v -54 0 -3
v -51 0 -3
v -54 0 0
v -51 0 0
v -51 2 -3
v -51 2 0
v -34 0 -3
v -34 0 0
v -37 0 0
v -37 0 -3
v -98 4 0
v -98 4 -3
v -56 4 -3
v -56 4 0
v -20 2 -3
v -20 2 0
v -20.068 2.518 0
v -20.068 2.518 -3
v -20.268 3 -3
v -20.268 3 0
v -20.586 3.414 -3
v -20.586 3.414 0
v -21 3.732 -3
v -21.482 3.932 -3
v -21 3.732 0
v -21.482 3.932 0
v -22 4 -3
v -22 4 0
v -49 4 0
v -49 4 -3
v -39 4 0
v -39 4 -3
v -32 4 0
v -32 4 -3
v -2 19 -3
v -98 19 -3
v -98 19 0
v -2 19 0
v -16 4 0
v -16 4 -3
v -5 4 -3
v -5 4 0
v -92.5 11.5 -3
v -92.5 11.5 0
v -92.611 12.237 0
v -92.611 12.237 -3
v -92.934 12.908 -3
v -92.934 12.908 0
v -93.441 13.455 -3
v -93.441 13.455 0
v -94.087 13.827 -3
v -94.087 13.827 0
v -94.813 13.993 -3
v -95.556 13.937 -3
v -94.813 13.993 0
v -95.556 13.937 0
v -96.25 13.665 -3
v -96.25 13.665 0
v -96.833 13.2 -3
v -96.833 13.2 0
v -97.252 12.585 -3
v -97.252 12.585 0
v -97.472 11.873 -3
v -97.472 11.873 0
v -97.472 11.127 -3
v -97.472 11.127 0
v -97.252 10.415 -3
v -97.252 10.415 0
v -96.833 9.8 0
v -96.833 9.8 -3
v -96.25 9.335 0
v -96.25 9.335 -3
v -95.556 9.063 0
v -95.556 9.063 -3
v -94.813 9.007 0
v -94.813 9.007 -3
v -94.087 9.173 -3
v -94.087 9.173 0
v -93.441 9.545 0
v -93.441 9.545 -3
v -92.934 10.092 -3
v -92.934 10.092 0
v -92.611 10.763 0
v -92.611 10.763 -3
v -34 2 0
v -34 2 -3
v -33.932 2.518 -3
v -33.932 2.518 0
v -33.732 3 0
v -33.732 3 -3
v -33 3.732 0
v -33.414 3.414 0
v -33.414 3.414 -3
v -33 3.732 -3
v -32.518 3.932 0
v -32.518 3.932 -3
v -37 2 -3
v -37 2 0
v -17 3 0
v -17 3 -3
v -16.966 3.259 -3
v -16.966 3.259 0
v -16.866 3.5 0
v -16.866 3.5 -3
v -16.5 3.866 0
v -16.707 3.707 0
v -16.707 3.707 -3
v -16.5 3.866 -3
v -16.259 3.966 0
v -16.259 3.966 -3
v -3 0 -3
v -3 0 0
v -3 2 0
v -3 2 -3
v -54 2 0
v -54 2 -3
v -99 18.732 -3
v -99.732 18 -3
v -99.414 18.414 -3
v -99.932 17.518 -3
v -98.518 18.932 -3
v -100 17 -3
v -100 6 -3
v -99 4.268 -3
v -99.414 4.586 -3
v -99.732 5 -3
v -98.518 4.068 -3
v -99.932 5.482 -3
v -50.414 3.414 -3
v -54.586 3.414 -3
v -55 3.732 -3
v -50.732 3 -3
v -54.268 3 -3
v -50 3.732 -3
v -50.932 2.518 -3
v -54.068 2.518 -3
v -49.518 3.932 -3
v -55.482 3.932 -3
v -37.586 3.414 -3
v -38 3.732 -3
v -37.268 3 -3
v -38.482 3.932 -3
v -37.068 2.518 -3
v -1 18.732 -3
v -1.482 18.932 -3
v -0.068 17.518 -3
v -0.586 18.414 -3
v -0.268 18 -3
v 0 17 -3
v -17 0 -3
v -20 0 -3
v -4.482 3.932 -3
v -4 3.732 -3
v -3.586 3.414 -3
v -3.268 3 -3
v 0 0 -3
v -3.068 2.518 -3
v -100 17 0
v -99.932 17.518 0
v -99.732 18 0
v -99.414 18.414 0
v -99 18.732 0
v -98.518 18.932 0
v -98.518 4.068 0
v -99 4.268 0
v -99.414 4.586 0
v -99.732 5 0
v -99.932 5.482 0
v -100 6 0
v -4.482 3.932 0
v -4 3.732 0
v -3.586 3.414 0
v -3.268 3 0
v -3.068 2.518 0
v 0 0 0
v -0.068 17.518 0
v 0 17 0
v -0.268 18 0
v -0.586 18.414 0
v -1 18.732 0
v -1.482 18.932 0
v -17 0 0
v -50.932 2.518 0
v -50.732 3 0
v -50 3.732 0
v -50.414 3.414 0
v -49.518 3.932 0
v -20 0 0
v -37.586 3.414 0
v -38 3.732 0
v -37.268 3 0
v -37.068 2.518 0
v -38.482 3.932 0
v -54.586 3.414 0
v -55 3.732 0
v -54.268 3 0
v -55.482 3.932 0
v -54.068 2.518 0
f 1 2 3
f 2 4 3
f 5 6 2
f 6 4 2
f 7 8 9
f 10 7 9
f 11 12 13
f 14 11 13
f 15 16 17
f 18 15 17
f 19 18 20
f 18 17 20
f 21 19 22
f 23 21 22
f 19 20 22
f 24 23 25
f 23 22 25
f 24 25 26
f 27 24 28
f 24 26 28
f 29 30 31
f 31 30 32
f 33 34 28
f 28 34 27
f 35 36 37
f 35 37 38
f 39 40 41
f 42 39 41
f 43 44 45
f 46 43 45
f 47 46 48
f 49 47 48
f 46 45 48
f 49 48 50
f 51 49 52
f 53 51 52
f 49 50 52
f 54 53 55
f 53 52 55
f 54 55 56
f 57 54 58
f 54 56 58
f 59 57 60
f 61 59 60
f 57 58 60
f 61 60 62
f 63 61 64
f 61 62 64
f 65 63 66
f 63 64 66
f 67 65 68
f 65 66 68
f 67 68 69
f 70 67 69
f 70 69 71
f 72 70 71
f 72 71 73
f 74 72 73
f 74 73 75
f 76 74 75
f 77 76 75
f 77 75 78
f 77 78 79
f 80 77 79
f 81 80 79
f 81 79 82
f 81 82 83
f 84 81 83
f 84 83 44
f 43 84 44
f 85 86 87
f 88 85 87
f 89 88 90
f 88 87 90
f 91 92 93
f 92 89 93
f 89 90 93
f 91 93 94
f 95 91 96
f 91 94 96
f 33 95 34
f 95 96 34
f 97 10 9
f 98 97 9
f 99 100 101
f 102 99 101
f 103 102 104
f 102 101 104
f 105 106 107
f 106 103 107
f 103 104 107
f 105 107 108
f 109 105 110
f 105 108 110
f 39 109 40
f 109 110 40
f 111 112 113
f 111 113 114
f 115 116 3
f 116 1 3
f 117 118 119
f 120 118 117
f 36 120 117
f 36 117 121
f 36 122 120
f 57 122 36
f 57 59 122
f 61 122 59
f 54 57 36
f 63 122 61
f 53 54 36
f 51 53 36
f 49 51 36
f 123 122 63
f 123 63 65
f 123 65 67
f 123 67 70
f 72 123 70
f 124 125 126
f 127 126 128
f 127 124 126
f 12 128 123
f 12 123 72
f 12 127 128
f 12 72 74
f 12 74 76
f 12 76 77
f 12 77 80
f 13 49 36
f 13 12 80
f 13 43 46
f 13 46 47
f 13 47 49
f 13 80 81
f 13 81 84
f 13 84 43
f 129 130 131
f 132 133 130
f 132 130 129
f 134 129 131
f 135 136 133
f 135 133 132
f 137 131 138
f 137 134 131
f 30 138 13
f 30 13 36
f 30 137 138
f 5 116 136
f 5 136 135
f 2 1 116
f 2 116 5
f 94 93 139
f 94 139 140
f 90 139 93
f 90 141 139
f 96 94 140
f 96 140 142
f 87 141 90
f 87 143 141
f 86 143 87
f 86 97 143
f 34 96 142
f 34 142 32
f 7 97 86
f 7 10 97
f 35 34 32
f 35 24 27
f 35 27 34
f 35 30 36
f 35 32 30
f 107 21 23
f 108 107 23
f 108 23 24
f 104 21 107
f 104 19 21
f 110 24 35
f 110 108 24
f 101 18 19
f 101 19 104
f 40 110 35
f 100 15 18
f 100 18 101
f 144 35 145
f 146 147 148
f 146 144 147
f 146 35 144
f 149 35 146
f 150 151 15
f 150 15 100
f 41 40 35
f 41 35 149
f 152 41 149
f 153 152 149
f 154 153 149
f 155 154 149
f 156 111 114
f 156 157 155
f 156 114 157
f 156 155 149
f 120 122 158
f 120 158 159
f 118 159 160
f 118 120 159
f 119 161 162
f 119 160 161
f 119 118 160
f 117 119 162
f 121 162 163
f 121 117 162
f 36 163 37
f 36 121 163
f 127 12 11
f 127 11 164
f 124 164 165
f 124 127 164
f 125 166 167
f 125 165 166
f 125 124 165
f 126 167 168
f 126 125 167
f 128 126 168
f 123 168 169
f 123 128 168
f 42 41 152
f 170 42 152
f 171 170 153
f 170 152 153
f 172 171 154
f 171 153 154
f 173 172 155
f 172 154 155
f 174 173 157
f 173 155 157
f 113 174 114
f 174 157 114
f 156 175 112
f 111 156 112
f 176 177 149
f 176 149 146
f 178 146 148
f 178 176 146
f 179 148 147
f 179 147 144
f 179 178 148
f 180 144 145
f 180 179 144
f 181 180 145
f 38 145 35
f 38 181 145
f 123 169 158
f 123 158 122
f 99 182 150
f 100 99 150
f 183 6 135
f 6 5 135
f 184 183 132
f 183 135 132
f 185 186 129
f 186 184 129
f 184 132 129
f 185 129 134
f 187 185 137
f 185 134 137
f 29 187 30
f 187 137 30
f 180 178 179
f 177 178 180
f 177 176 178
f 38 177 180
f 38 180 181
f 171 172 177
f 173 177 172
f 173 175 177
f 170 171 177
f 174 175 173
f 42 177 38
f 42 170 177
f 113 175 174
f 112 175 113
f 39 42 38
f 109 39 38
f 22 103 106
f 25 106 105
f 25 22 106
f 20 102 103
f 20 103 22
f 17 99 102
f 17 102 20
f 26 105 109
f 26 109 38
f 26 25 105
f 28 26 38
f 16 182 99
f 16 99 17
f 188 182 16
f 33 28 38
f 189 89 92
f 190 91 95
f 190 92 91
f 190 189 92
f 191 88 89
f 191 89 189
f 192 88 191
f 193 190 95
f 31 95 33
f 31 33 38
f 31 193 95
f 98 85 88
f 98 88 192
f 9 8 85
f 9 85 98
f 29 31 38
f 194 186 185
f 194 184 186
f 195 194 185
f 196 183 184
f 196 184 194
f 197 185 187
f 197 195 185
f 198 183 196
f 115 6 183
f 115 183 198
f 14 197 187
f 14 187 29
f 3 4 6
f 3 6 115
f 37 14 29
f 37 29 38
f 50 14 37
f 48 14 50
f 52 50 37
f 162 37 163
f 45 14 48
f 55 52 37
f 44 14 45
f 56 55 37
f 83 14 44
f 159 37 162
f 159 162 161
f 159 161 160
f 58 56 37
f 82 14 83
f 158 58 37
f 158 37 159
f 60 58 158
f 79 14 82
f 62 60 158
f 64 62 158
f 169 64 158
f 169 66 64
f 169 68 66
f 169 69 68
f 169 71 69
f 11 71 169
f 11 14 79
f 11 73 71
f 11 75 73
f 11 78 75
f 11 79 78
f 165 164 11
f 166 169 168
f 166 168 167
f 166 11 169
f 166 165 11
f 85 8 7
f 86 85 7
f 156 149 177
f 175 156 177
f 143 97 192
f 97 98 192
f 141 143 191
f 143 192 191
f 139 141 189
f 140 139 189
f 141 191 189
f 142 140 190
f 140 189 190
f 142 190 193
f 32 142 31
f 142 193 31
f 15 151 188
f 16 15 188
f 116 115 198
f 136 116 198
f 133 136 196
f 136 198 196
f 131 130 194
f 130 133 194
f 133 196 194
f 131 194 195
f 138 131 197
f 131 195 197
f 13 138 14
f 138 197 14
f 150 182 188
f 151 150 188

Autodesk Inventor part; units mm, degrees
ref_plane "YZ Plane" through (0, 0, 0) normal (1, 0, 0) x (0, 1, 0)
ref_plane "XZ Plane" through (0, 0, 0) normal (0, 1, 0) x (-1, 0, 0)
ref_plane "XY Plane" through (0, 0, 0) normal (0, 0, 1) x (1, 0, 0)
sketch "Эскиз1" plane through (0, 0, 0) normal (0, 1, 0) x (-1, 0, 0)
  line L0 (0, 0) -> (3, 0)
  line L1 (3, 0) -> (3, -3)
  line L2 (3, -3) -> (0, -3)
  line L3 (0, -3) -> (0, 0)
  line L4 (3, 0) -> (20, 0)
  line L5 (20, 0) -> (17, 0)
  line L6 (17, 0) -> (17, -3)
  line L7 (17, -3) -> (20, -3)
  line L8 (20, -3) -> (20, 0)
  line L9 (20, 0) -> (37, 0)
  line L10 (37, 0) -> (34, 0)
  line L11 (34, 0) -> (34, -3)
  line L12 (34, -3) -> (37, -3)
  line L13 (37, -3) -> (37, 0)
  line L14 (37, 0) -> (54, 0)
  line L15 (54, 0) -> (51, 0)
  line L16 (51, 0) -> (51, -3)
  line L17 (51, -3) -> (54, -3)
  line L18 (54, -3) -> (54, 0)
  point P0 (17, 0)
  point P1 (17, 0)
  dimension "d0" = 3
  dimension "d1" = 3
  dimension "d17" = 17
  dimension "d18" = 3
  dimension "d19" = 3
  dimension "d20" = 17
  dimension "d21" = 17
  dimension "d22" = 3
  dimension "d23" = 3
  dimension "d24" = 3
  dimension "d25" = 3
extrude "Выдавливание1" add sketch "Эскиз1" along normal blind 4
sketch "Эскиз2" plane through (0, 4, 0) normal (0, 1, 0) x (1, 0, 0)
  line L0 (0, 0) -> (-100, 0)
  line L1 (-100, 0) -> (-100, 3)
  line L2 (-100, 3) -> (0, 3)
  line L3 (0, 3) -> (0, 0)
  dimension "d13" = 3
  dimension "d14" = 100
extrude "Выдавливание2" add sketch "Эскиз2" along normal blind 15
fillet "Сопряжение1" radius 1 1 edges at (-17, 4, -1.5)
fillet "Сопряжение2" radius 2 7 edges at (-34, 4, -1.5) (-51, 4, -1.5) (-54, 4, -1.5) (-37, 4, -1.5) (-20, 4, -1.5) (-3, 4, -1.5) (0, 19, -1.5)
fillet "Сопряжение3" radius 2 2 edges at (-100, 19, -1.5) (-100, 4, -1.5)
sketch "Эскиз3" plane through (-54, 0, 0) normal (0, 0, 1) x (1, 0, 0)
  line L0 (-46, 6) -> (-46, 17) projected
  circle A0 centre (-41, 11.5) radius 2.5
  line L1 (-46, 15.899) -> (-46, 11.5)
  point P0 (54, 0)
  dimension "d30" = 5
extrude "Выдавливание3" cut sketch "Эскиз3" against normal blind 14
properties part number "Bus_copper_VDD" material "Медь"
